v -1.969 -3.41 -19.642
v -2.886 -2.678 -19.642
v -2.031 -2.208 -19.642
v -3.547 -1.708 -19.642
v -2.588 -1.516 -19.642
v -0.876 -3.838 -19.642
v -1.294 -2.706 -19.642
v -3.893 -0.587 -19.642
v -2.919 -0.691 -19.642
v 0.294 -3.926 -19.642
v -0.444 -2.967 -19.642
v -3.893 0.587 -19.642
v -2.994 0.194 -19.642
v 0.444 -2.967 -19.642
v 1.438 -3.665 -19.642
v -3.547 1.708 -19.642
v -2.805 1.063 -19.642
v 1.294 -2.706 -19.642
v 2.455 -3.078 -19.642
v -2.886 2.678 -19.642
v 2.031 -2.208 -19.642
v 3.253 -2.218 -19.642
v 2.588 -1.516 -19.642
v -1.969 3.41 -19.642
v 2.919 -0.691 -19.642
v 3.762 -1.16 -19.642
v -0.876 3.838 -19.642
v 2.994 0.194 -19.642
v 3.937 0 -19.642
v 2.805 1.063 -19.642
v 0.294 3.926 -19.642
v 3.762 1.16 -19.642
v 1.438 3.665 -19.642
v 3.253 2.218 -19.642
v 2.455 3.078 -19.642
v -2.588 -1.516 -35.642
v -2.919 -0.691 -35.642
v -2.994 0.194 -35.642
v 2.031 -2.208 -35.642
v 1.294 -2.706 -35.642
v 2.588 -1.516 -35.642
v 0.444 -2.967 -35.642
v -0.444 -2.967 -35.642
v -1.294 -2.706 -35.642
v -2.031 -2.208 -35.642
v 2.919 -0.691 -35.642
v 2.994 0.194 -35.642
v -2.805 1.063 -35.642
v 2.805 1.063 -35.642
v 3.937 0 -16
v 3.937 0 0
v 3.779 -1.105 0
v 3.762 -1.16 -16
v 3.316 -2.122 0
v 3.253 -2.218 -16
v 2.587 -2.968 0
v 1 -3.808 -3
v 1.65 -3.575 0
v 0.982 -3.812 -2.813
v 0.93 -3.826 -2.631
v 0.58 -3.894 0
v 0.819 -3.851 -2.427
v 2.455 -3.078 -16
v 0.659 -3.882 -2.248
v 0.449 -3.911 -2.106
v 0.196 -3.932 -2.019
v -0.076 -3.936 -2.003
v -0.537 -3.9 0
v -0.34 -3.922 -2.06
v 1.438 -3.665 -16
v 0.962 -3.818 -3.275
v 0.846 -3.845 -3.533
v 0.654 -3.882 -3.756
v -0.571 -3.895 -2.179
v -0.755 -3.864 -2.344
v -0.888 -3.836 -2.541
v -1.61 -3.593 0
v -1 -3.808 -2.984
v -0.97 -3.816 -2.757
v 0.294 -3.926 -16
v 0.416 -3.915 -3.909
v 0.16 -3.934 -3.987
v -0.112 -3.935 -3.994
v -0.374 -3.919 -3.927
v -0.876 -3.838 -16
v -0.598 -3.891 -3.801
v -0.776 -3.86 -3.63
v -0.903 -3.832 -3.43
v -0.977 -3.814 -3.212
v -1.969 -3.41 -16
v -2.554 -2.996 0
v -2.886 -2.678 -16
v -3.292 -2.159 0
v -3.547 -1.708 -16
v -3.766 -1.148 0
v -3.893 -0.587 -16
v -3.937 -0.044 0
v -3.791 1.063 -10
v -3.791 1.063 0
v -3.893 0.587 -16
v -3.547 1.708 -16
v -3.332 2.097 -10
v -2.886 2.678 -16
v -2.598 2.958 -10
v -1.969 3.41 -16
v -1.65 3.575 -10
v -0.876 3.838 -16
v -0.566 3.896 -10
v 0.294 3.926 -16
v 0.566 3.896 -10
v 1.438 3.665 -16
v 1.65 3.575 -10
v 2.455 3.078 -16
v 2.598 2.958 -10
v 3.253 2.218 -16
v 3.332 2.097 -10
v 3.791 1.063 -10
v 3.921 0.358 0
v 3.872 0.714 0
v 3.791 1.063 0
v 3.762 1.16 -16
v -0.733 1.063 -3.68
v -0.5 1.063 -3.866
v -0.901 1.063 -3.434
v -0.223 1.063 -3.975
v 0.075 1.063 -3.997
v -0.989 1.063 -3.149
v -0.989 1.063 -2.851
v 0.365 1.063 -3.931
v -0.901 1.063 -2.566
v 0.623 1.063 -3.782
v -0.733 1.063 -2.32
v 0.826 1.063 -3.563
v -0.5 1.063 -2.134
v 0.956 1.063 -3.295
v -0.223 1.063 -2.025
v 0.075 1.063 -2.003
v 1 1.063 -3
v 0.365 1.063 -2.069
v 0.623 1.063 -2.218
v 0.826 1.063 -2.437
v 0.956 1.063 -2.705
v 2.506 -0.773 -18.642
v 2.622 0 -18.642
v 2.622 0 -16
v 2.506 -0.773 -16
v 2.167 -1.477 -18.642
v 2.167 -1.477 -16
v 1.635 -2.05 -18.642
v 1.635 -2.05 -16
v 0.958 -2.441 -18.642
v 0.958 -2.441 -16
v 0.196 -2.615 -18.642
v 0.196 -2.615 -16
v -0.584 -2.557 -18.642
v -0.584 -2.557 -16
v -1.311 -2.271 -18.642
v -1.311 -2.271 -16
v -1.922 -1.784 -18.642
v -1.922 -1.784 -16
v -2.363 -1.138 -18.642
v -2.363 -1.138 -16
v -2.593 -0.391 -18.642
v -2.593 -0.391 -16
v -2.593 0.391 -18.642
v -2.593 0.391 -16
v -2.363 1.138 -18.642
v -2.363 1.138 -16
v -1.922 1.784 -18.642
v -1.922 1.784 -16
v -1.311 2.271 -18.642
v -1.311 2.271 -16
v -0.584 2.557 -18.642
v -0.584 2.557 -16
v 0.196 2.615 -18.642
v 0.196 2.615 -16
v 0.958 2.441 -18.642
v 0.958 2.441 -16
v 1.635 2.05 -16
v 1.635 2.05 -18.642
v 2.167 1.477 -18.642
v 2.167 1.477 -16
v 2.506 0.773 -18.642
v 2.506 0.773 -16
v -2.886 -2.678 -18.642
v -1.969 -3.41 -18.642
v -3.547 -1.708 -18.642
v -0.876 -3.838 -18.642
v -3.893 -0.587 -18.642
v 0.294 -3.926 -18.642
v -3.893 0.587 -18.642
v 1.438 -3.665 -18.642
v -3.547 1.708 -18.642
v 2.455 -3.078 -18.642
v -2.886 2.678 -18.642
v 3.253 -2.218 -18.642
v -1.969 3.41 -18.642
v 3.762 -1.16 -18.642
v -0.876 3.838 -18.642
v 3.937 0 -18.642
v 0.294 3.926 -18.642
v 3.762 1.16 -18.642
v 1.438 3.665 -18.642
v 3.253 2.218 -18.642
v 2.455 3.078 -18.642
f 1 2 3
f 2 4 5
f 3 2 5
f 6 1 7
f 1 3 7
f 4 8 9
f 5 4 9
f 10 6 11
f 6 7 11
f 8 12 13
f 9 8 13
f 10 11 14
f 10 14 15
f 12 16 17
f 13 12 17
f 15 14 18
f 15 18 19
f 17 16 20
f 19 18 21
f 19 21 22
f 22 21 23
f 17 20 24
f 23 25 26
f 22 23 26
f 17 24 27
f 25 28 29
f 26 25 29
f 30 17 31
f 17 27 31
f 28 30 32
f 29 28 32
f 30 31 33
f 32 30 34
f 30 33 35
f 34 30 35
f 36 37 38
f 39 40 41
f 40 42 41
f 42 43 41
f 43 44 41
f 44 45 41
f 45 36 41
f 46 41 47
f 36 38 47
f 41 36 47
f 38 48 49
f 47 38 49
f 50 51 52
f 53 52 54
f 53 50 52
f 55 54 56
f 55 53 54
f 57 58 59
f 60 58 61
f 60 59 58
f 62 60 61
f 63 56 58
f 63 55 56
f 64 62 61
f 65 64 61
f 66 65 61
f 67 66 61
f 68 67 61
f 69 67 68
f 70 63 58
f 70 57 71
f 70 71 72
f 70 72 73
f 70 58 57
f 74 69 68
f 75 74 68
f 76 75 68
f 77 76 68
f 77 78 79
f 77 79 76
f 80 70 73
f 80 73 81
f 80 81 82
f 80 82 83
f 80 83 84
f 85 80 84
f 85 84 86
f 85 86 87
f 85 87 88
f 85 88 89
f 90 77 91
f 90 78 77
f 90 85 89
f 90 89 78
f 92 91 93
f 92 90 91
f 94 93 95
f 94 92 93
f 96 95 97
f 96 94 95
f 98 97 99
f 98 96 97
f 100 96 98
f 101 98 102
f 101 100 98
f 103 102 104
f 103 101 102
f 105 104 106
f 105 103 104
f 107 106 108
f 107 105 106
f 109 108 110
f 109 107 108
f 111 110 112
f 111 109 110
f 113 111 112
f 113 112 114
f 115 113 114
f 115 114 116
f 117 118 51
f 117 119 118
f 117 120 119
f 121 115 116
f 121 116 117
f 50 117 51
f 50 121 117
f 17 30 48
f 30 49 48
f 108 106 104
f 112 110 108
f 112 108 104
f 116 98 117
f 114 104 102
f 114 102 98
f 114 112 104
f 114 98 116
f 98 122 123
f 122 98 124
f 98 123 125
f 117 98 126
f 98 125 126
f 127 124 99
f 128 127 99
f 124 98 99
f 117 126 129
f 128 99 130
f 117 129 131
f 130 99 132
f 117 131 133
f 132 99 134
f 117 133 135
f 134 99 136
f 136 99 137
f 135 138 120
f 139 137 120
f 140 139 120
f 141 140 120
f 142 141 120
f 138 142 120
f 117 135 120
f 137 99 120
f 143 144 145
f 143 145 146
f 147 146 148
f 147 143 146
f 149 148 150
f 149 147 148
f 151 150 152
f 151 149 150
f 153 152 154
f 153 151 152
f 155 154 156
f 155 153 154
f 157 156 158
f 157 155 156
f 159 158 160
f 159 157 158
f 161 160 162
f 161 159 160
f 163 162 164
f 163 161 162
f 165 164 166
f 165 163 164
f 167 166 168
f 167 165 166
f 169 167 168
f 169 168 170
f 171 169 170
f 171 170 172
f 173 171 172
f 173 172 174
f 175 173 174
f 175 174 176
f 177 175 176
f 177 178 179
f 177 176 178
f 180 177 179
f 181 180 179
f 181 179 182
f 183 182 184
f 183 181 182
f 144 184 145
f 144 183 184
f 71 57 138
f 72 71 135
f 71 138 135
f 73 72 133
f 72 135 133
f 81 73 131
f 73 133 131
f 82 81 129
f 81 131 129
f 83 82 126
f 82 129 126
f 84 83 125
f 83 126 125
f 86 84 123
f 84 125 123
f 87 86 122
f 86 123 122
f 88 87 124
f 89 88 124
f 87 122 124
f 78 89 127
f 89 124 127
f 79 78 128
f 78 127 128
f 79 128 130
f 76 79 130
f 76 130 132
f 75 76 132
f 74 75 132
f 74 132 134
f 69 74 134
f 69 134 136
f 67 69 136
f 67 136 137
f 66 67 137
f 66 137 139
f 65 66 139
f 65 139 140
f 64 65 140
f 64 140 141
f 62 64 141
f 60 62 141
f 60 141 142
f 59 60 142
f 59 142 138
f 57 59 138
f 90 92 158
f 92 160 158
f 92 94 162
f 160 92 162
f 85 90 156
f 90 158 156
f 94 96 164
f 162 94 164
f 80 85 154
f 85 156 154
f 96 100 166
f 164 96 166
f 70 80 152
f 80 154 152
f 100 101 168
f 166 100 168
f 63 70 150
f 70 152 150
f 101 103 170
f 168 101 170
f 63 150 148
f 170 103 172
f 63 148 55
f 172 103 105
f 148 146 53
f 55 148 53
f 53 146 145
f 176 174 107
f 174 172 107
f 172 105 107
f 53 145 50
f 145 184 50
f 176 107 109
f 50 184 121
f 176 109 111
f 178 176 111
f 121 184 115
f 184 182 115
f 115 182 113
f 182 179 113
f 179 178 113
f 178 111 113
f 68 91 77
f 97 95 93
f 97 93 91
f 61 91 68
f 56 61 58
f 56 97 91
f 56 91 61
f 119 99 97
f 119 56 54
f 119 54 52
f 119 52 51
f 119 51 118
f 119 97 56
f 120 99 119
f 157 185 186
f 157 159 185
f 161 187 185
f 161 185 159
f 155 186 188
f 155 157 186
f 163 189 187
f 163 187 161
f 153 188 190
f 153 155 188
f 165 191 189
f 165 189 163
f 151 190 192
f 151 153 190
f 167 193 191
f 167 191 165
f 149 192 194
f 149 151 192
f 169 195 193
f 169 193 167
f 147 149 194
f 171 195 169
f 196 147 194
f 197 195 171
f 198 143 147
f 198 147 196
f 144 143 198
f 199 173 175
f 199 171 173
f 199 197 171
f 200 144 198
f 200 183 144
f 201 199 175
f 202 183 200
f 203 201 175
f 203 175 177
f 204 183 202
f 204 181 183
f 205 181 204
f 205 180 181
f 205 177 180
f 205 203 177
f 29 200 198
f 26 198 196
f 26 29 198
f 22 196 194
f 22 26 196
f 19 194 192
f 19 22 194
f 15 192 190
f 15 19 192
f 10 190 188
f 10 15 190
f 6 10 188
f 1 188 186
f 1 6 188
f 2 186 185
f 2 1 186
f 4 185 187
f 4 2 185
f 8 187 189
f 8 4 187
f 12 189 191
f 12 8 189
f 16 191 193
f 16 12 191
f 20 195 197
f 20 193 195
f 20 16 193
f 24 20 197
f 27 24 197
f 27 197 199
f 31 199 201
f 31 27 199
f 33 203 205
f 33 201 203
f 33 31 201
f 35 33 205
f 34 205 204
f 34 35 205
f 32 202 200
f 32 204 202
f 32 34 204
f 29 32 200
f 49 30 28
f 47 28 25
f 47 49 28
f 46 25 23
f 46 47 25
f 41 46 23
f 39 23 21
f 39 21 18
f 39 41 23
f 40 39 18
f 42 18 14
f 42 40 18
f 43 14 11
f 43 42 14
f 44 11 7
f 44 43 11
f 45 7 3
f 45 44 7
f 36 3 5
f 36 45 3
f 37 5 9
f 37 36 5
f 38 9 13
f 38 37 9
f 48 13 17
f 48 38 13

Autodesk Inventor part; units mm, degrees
ref_plane "YZ Plane" through (0, 0, 0) normal (1, 0, 0) x (0, 1, 0)
ref_plane "XZ Plane" through (0, 0, 0) normal (0, 1, 0) x (-1, 0, 0)
ref_plane "XY Plane" through (0, 0, 0) normal (0, 0, 1) x (1, 0, 0)
sketch "Sketch1" plane through (0, 0, 0) normal (0, 1, 0) x (-1, 0, 0)
  line L0 (0, 0) -> (-2.8001, 0)
  line L1 (-2.8001, 0) -> (-3.937, 0)
  line L2 (-3.937, 0) -> (-3.937, -16)
  line L3 (-3.937, -16) -> (-2.6225, -16)
  line L4 (-2.6225, -16) -> (-2.6225, -18.6416)
  line L5 (-2.6225, -18.6416) -> (-3.937, -18.6416)
  line L6 (-3.937, -18.6416) -> (-3.937, -19.6416)
  line L7 (-2.8001, 0) -> (0, 0)
  line L8 (-2.8001, 0) -> (0, 0)
  line L9 (-3.937, -19.6416) -> (-3, -19.6416)
  line L10 (-3, -19.6416) -> (-3, -35.6416)
  line L11 (-3, -35.6416) -> (0, -35.6416)
  line L12 (0, -35.6416) -> (0, 0)
  dimension "d1" = 0
  dimension "d2" = 16
  dimension "d3" = 2.6416
  dimension "d6" = 3.937
  dimension "d8" = 3
  dimension "d13" = 1
  dimension "d29" = 2.6225
  dimension "d30" = 16
revolve "Revolution1" add sketch "Sketch1" angle 360 about axis through (0, 0, -35.6416) along (0, 0, 1)
thread "Thread1" size "M6x1" class "6g" standard "ANSI Metric M Profile" full length
sketch "Sketch3" plane through (0, 0, 0) normal (0, 0, 1) x (1, 0, 0)
  circle A0 centre (0, 0) radius 3.937 projected
  line L0 (-3.033, -2.5101) -> (3.033, -2.5101)
  line L1 (-3.7908, 1.063) -> (3.7908, 1.063)
  arc A1 (3.033, -2.5101) -> (3.7908, 1.063) centre (0, 0) ccw
  arc A2 (-3.7908, 1.063) -> (-3.033, -2.5101) centre (0, 0) ccw
  point P0 (0, 0)
  dimension "d36" = 5
extrude "Extrusion1" cut sketch "Sketch3" against normal blind 10 contours L1 A0
sketch "Sketch4" plane through (-3.7908, 1.063, 0) normal (0, 1, 0) x (1, 0, 0)
  circle A0 centre (3.7908, 3) radius 1
  point P0 (3.7908, 0)
  dimension "d23" = 2
  dimension "d24" = 3
extrude "Extrusion2" cut sketch "Sketch4" against normal blind 10
thread "Thread2" size "M2x0.4" class "6H" standard "ANSI Metric M Profile" full length
sketch "Sketch5" plane through (0, 0, -35.6416) normal (0, 0, -1) x (-1, 0, 0)
  circle A0 centre (0, 0) radius 3.937 projected
  line L0 (-3.7908, 1.063) -> (5.4234, 1.063)
  line L1 (5.4234, 1.063) -> (5.4234, 3.7958)
  line L2 (5.4234, 3.7958) -> (-3.7908, 3.7958)
  line L3 (-3.7908, 3.7958) -> (-3.7908, 1.063)
  point P0 (0, 0)
  dimension "d33" = 5
extrude "Extrusion3" cut sketch "Sketch5" against normal blind 16 contours L3 L2 A0 | A0 L2 L0 | A0 L2 L1 L0
properties part number "rod"
